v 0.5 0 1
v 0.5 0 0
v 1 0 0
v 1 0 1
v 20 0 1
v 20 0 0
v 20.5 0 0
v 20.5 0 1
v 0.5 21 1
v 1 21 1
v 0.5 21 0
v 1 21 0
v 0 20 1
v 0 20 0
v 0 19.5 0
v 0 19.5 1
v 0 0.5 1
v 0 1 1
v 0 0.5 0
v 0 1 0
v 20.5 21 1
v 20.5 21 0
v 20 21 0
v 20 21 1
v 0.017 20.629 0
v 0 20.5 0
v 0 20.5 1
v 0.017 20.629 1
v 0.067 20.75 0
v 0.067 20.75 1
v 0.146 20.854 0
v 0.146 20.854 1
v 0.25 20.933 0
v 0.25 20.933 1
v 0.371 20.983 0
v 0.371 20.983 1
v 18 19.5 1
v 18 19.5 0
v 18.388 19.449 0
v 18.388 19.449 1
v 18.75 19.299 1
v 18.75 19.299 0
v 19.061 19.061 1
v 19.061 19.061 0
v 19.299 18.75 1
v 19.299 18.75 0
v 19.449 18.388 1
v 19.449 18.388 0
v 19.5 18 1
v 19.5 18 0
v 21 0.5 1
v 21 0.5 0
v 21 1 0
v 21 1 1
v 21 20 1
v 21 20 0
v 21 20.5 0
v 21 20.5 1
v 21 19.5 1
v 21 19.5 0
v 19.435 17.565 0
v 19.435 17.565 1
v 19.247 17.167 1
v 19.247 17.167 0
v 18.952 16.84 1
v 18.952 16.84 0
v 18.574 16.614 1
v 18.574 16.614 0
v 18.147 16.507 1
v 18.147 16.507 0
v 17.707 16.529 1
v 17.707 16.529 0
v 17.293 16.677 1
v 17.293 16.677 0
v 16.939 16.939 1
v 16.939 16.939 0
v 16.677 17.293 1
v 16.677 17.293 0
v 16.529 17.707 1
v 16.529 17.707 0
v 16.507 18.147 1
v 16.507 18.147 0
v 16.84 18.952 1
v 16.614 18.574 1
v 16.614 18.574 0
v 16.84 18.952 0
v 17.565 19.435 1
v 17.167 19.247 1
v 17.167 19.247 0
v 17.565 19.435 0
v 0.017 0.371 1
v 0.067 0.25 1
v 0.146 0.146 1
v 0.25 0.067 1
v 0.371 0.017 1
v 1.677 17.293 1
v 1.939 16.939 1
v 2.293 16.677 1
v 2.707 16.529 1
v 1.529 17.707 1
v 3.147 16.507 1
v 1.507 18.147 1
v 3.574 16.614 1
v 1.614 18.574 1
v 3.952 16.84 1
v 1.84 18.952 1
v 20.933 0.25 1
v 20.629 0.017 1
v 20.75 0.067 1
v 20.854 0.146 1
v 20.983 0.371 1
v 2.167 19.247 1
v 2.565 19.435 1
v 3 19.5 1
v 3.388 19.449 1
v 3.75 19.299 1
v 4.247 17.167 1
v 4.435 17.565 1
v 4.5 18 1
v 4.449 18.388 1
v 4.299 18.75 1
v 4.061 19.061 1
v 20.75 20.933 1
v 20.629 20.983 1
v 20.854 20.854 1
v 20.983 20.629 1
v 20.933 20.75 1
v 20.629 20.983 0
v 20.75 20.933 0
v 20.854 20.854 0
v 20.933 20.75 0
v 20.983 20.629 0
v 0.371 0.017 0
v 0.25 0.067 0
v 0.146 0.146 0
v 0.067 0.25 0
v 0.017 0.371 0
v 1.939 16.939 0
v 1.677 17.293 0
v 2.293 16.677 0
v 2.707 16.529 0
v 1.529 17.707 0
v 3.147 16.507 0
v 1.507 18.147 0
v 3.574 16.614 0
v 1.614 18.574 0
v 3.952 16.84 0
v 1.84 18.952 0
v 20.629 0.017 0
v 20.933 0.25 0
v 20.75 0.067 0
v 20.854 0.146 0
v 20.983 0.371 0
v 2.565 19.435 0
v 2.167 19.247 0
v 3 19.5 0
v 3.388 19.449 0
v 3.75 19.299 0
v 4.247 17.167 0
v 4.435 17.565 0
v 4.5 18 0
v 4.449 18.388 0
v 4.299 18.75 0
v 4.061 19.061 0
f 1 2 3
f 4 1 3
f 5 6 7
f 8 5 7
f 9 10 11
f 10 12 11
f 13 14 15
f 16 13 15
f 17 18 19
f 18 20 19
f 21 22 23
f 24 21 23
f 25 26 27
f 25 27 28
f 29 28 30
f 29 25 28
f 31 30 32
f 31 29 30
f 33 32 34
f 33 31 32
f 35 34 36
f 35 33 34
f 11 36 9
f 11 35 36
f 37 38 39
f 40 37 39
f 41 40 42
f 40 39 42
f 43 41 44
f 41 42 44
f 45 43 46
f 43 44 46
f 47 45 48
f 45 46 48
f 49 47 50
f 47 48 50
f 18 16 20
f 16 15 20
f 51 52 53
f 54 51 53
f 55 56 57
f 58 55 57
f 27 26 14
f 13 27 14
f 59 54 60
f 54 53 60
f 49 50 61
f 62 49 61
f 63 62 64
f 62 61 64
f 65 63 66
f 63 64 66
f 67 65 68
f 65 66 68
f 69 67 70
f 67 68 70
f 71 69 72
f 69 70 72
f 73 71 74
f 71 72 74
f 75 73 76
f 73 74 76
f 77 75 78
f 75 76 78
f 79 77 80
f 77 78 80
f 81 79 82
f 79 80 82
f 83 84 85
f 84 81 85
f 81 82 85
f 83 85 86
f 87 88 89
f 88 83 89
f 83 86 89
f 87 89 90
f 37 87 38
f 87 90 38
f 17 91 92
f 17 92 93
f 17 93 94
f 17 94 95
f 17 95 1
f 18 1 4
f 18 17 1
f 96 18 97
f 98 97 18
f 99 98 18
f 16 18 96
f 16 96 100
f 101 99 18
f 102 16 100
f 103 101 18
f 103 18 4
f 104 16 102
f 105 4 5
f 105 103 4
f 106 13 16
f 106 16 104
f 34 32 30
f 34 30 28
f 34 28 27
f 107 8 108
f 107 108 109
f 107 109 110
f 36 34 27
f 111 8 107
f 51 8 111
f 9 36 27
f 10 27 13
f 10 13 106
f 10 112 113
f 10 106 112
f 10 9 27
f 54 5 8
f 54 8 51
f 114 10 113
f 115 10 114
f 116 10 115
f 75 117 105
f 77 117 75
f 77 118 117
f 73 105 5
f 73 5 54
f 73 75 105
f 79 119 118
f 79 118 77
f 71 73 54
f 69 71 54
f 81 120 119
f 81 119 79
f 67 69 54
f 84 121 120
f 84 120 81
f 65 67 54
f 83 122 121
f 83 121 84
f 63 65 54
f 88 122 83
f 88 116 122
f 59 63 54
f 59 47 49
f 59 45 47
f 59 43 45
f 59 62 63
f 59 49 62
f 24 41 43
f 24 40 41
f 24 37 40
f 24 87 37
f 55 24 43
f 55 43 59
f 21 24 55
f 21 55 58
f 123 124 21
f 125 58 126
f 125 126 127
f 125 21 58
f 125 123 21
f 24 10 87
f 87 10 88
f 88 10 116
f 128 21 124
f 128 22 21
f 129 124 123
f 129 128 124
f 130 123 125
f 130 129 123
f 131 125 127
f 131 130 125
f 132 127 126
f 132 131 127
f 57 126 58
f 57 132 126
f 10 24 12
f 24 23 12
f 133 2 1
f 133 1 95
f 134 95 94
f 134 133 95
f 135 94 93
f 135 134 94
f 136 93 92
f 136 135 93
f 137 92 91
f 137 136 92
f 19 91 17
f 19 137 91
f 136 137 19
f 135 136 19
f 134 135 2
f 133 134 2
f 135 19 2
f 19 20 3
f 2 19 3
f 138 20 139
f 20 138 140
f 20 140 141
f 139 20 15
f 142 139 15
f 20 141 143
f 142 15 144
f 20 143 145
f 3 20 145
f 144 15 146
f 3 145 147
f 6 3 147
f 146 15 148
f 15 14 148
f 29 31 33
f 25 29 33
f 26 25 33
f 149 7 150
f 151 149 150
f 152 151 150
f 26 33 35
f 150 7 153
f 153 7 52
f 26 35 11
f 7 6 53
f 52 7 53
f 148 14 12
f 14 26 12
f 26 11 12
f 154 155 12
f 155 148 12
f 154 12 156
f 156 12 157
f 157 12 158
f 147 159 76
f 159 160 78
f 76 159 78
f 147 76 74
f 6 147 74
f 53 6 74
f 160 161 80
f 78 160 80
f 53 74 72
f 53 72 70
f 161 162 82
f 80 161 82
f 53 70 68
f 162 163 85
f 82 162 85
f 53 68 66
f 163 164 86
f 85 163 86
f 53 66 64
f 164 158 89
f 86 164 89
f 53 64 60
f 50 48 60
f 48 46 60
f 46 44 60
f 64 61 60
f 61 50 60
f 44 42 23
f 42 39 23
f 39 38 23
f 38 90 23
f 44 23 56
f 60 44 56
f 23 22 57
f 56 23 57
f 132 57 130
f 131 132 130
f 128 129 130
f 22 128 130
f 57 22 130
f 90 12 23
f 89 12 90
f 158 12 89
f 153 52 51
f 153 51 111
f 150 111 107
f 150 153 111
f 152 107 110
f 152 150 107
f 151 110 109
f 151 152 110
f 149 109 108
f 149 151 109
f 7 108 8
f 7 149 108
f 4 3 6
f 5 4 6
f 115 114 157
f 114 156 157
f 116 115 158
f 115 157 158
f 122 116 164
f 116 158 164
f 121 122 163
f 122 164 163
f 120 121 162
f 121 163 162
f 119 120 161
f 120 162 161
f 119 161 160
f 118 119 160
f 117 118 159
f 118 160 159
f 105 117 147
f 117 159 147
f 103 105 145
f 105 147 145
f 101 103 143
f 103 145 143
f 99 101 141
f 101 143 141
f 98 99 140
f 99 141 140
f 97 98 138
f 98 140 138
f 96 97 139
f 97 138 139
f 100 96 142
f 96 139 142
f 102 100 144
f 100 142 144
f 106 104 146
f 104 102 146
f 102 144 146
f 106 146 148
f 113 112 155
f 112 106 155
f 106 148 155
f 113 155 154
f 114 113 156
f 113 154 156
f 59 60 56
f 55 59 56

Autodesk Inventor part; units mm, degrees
ref_plane "YZ Plane" through (0, 0, 0) normal (1, 0, 0) x (0, 1, 0)
ref_plane "XZ Plane" through (0, 0, 0) normal (0, 1, 0) x (-1, 0, 0)
ref_plane "XY Plane" through (0, 0, 0) normal (0, 0, 1) x (1, 0, 0)
sketch "Sketch1" plane through (0, 0, 0) normal (0, 0, 1) x (1, 0, 0)
  line L0 (0.5, 0) -> (20.5, 0)
  line L1 (21, 0.5) -> (21, 20.5)
  line L2 (20.5, 21) -> (0.5, 21)
  line L3 (0, 20.5) -> (0, 0.5)
  line L4 (0, 20.5) -> (0, 20)
  line L5 (1, 21) -> (0.5, 21)
  line L6 (0, 1) -> (0, 0.5)
  line L7 (0.5, 0) -> (1, 0)
  line L8 (21, 20) -> (21, 20.5)
  line L9 (20.5, 21) -> (20, 21)
  line L10 (20, 0) -> (20.5, 0)
  line L11 (21, 0.5) -> (21, 1)
  arc A0 (0.5, 21) -> (0, 20.5) centre (0.5, 20.5) ccw
  arc A1 (21, 20.5) -> (20.5, 21) centre (20.5, 20.5) ccw
  arc A2 (20.5, 0) -> (21, 0.5) centre (20.5, 0.5) ccw
  arc A3 (0, 0.5) -> (0.5, 0) centre (0.5, 0.5) ccw
  line L12 (0, 21) -> (0, 19.5)
  line L13 (0, 19.5) -> (3, 19.5)
  line L14 (21, 21) -> (21, 19.5)
  line L15 (21, 19.5) -> (18, 19.5)
  line L16 (3, 19.5) -> (3, 18)
  line L17 (18, 19.5) -> (18, 18)
  circle A4 centre (3, 18) radius 1.5
  circle A5 centre (18, 18) radius 1.5
  point P0 (0, 0)
  dimension "d4" = 1.5
  dimension "d5" = 3
  dimension "d6" = 1.5
  dimension "d7" = 3
  dimension "d8" = 1.5
  dimension "d9" = 1.5
extrude "Extrusion1" add sketch "Sketch1" along normal blind 1
sketch "Sketch2" plane through (0, 0, 1) normal (0, 0, 1) x (1, 0, 0)
  line L0 (20.5, 21) -> (0.5, 21) projected
  circle A0 centre (18, 18) radius 1.5 projected
  circle A1 centre (3, 18) radius 1.5 projected
  line L1 (20.5, 21) -> (0.5, 21) projected
  arc A2 (0.5, 21) -> (0, 20.5) centre (0.5, 20.5) ccw projected
  line L2 (0, 20.5) -> (0, 0.5) projected
  arc A3 (0, 0.5) -> (0.5, 0) centre (0.5, 0.5) ccw projected
  line L3 (0.5, 0) -> (20.5, 0) projected
  arc A4 (20.5, 0) -> (21, 0.5) centre (20.5, 0.5) ccw projected
  line L4 (21, 0.5) -> (21, 20.5) projected
  arc A5 (21, 20.5) -> (20.5, 21) centre (20.5, 20.5) ccw projected
  point P0 (0, 0)
properties part number "RGBsensor"
